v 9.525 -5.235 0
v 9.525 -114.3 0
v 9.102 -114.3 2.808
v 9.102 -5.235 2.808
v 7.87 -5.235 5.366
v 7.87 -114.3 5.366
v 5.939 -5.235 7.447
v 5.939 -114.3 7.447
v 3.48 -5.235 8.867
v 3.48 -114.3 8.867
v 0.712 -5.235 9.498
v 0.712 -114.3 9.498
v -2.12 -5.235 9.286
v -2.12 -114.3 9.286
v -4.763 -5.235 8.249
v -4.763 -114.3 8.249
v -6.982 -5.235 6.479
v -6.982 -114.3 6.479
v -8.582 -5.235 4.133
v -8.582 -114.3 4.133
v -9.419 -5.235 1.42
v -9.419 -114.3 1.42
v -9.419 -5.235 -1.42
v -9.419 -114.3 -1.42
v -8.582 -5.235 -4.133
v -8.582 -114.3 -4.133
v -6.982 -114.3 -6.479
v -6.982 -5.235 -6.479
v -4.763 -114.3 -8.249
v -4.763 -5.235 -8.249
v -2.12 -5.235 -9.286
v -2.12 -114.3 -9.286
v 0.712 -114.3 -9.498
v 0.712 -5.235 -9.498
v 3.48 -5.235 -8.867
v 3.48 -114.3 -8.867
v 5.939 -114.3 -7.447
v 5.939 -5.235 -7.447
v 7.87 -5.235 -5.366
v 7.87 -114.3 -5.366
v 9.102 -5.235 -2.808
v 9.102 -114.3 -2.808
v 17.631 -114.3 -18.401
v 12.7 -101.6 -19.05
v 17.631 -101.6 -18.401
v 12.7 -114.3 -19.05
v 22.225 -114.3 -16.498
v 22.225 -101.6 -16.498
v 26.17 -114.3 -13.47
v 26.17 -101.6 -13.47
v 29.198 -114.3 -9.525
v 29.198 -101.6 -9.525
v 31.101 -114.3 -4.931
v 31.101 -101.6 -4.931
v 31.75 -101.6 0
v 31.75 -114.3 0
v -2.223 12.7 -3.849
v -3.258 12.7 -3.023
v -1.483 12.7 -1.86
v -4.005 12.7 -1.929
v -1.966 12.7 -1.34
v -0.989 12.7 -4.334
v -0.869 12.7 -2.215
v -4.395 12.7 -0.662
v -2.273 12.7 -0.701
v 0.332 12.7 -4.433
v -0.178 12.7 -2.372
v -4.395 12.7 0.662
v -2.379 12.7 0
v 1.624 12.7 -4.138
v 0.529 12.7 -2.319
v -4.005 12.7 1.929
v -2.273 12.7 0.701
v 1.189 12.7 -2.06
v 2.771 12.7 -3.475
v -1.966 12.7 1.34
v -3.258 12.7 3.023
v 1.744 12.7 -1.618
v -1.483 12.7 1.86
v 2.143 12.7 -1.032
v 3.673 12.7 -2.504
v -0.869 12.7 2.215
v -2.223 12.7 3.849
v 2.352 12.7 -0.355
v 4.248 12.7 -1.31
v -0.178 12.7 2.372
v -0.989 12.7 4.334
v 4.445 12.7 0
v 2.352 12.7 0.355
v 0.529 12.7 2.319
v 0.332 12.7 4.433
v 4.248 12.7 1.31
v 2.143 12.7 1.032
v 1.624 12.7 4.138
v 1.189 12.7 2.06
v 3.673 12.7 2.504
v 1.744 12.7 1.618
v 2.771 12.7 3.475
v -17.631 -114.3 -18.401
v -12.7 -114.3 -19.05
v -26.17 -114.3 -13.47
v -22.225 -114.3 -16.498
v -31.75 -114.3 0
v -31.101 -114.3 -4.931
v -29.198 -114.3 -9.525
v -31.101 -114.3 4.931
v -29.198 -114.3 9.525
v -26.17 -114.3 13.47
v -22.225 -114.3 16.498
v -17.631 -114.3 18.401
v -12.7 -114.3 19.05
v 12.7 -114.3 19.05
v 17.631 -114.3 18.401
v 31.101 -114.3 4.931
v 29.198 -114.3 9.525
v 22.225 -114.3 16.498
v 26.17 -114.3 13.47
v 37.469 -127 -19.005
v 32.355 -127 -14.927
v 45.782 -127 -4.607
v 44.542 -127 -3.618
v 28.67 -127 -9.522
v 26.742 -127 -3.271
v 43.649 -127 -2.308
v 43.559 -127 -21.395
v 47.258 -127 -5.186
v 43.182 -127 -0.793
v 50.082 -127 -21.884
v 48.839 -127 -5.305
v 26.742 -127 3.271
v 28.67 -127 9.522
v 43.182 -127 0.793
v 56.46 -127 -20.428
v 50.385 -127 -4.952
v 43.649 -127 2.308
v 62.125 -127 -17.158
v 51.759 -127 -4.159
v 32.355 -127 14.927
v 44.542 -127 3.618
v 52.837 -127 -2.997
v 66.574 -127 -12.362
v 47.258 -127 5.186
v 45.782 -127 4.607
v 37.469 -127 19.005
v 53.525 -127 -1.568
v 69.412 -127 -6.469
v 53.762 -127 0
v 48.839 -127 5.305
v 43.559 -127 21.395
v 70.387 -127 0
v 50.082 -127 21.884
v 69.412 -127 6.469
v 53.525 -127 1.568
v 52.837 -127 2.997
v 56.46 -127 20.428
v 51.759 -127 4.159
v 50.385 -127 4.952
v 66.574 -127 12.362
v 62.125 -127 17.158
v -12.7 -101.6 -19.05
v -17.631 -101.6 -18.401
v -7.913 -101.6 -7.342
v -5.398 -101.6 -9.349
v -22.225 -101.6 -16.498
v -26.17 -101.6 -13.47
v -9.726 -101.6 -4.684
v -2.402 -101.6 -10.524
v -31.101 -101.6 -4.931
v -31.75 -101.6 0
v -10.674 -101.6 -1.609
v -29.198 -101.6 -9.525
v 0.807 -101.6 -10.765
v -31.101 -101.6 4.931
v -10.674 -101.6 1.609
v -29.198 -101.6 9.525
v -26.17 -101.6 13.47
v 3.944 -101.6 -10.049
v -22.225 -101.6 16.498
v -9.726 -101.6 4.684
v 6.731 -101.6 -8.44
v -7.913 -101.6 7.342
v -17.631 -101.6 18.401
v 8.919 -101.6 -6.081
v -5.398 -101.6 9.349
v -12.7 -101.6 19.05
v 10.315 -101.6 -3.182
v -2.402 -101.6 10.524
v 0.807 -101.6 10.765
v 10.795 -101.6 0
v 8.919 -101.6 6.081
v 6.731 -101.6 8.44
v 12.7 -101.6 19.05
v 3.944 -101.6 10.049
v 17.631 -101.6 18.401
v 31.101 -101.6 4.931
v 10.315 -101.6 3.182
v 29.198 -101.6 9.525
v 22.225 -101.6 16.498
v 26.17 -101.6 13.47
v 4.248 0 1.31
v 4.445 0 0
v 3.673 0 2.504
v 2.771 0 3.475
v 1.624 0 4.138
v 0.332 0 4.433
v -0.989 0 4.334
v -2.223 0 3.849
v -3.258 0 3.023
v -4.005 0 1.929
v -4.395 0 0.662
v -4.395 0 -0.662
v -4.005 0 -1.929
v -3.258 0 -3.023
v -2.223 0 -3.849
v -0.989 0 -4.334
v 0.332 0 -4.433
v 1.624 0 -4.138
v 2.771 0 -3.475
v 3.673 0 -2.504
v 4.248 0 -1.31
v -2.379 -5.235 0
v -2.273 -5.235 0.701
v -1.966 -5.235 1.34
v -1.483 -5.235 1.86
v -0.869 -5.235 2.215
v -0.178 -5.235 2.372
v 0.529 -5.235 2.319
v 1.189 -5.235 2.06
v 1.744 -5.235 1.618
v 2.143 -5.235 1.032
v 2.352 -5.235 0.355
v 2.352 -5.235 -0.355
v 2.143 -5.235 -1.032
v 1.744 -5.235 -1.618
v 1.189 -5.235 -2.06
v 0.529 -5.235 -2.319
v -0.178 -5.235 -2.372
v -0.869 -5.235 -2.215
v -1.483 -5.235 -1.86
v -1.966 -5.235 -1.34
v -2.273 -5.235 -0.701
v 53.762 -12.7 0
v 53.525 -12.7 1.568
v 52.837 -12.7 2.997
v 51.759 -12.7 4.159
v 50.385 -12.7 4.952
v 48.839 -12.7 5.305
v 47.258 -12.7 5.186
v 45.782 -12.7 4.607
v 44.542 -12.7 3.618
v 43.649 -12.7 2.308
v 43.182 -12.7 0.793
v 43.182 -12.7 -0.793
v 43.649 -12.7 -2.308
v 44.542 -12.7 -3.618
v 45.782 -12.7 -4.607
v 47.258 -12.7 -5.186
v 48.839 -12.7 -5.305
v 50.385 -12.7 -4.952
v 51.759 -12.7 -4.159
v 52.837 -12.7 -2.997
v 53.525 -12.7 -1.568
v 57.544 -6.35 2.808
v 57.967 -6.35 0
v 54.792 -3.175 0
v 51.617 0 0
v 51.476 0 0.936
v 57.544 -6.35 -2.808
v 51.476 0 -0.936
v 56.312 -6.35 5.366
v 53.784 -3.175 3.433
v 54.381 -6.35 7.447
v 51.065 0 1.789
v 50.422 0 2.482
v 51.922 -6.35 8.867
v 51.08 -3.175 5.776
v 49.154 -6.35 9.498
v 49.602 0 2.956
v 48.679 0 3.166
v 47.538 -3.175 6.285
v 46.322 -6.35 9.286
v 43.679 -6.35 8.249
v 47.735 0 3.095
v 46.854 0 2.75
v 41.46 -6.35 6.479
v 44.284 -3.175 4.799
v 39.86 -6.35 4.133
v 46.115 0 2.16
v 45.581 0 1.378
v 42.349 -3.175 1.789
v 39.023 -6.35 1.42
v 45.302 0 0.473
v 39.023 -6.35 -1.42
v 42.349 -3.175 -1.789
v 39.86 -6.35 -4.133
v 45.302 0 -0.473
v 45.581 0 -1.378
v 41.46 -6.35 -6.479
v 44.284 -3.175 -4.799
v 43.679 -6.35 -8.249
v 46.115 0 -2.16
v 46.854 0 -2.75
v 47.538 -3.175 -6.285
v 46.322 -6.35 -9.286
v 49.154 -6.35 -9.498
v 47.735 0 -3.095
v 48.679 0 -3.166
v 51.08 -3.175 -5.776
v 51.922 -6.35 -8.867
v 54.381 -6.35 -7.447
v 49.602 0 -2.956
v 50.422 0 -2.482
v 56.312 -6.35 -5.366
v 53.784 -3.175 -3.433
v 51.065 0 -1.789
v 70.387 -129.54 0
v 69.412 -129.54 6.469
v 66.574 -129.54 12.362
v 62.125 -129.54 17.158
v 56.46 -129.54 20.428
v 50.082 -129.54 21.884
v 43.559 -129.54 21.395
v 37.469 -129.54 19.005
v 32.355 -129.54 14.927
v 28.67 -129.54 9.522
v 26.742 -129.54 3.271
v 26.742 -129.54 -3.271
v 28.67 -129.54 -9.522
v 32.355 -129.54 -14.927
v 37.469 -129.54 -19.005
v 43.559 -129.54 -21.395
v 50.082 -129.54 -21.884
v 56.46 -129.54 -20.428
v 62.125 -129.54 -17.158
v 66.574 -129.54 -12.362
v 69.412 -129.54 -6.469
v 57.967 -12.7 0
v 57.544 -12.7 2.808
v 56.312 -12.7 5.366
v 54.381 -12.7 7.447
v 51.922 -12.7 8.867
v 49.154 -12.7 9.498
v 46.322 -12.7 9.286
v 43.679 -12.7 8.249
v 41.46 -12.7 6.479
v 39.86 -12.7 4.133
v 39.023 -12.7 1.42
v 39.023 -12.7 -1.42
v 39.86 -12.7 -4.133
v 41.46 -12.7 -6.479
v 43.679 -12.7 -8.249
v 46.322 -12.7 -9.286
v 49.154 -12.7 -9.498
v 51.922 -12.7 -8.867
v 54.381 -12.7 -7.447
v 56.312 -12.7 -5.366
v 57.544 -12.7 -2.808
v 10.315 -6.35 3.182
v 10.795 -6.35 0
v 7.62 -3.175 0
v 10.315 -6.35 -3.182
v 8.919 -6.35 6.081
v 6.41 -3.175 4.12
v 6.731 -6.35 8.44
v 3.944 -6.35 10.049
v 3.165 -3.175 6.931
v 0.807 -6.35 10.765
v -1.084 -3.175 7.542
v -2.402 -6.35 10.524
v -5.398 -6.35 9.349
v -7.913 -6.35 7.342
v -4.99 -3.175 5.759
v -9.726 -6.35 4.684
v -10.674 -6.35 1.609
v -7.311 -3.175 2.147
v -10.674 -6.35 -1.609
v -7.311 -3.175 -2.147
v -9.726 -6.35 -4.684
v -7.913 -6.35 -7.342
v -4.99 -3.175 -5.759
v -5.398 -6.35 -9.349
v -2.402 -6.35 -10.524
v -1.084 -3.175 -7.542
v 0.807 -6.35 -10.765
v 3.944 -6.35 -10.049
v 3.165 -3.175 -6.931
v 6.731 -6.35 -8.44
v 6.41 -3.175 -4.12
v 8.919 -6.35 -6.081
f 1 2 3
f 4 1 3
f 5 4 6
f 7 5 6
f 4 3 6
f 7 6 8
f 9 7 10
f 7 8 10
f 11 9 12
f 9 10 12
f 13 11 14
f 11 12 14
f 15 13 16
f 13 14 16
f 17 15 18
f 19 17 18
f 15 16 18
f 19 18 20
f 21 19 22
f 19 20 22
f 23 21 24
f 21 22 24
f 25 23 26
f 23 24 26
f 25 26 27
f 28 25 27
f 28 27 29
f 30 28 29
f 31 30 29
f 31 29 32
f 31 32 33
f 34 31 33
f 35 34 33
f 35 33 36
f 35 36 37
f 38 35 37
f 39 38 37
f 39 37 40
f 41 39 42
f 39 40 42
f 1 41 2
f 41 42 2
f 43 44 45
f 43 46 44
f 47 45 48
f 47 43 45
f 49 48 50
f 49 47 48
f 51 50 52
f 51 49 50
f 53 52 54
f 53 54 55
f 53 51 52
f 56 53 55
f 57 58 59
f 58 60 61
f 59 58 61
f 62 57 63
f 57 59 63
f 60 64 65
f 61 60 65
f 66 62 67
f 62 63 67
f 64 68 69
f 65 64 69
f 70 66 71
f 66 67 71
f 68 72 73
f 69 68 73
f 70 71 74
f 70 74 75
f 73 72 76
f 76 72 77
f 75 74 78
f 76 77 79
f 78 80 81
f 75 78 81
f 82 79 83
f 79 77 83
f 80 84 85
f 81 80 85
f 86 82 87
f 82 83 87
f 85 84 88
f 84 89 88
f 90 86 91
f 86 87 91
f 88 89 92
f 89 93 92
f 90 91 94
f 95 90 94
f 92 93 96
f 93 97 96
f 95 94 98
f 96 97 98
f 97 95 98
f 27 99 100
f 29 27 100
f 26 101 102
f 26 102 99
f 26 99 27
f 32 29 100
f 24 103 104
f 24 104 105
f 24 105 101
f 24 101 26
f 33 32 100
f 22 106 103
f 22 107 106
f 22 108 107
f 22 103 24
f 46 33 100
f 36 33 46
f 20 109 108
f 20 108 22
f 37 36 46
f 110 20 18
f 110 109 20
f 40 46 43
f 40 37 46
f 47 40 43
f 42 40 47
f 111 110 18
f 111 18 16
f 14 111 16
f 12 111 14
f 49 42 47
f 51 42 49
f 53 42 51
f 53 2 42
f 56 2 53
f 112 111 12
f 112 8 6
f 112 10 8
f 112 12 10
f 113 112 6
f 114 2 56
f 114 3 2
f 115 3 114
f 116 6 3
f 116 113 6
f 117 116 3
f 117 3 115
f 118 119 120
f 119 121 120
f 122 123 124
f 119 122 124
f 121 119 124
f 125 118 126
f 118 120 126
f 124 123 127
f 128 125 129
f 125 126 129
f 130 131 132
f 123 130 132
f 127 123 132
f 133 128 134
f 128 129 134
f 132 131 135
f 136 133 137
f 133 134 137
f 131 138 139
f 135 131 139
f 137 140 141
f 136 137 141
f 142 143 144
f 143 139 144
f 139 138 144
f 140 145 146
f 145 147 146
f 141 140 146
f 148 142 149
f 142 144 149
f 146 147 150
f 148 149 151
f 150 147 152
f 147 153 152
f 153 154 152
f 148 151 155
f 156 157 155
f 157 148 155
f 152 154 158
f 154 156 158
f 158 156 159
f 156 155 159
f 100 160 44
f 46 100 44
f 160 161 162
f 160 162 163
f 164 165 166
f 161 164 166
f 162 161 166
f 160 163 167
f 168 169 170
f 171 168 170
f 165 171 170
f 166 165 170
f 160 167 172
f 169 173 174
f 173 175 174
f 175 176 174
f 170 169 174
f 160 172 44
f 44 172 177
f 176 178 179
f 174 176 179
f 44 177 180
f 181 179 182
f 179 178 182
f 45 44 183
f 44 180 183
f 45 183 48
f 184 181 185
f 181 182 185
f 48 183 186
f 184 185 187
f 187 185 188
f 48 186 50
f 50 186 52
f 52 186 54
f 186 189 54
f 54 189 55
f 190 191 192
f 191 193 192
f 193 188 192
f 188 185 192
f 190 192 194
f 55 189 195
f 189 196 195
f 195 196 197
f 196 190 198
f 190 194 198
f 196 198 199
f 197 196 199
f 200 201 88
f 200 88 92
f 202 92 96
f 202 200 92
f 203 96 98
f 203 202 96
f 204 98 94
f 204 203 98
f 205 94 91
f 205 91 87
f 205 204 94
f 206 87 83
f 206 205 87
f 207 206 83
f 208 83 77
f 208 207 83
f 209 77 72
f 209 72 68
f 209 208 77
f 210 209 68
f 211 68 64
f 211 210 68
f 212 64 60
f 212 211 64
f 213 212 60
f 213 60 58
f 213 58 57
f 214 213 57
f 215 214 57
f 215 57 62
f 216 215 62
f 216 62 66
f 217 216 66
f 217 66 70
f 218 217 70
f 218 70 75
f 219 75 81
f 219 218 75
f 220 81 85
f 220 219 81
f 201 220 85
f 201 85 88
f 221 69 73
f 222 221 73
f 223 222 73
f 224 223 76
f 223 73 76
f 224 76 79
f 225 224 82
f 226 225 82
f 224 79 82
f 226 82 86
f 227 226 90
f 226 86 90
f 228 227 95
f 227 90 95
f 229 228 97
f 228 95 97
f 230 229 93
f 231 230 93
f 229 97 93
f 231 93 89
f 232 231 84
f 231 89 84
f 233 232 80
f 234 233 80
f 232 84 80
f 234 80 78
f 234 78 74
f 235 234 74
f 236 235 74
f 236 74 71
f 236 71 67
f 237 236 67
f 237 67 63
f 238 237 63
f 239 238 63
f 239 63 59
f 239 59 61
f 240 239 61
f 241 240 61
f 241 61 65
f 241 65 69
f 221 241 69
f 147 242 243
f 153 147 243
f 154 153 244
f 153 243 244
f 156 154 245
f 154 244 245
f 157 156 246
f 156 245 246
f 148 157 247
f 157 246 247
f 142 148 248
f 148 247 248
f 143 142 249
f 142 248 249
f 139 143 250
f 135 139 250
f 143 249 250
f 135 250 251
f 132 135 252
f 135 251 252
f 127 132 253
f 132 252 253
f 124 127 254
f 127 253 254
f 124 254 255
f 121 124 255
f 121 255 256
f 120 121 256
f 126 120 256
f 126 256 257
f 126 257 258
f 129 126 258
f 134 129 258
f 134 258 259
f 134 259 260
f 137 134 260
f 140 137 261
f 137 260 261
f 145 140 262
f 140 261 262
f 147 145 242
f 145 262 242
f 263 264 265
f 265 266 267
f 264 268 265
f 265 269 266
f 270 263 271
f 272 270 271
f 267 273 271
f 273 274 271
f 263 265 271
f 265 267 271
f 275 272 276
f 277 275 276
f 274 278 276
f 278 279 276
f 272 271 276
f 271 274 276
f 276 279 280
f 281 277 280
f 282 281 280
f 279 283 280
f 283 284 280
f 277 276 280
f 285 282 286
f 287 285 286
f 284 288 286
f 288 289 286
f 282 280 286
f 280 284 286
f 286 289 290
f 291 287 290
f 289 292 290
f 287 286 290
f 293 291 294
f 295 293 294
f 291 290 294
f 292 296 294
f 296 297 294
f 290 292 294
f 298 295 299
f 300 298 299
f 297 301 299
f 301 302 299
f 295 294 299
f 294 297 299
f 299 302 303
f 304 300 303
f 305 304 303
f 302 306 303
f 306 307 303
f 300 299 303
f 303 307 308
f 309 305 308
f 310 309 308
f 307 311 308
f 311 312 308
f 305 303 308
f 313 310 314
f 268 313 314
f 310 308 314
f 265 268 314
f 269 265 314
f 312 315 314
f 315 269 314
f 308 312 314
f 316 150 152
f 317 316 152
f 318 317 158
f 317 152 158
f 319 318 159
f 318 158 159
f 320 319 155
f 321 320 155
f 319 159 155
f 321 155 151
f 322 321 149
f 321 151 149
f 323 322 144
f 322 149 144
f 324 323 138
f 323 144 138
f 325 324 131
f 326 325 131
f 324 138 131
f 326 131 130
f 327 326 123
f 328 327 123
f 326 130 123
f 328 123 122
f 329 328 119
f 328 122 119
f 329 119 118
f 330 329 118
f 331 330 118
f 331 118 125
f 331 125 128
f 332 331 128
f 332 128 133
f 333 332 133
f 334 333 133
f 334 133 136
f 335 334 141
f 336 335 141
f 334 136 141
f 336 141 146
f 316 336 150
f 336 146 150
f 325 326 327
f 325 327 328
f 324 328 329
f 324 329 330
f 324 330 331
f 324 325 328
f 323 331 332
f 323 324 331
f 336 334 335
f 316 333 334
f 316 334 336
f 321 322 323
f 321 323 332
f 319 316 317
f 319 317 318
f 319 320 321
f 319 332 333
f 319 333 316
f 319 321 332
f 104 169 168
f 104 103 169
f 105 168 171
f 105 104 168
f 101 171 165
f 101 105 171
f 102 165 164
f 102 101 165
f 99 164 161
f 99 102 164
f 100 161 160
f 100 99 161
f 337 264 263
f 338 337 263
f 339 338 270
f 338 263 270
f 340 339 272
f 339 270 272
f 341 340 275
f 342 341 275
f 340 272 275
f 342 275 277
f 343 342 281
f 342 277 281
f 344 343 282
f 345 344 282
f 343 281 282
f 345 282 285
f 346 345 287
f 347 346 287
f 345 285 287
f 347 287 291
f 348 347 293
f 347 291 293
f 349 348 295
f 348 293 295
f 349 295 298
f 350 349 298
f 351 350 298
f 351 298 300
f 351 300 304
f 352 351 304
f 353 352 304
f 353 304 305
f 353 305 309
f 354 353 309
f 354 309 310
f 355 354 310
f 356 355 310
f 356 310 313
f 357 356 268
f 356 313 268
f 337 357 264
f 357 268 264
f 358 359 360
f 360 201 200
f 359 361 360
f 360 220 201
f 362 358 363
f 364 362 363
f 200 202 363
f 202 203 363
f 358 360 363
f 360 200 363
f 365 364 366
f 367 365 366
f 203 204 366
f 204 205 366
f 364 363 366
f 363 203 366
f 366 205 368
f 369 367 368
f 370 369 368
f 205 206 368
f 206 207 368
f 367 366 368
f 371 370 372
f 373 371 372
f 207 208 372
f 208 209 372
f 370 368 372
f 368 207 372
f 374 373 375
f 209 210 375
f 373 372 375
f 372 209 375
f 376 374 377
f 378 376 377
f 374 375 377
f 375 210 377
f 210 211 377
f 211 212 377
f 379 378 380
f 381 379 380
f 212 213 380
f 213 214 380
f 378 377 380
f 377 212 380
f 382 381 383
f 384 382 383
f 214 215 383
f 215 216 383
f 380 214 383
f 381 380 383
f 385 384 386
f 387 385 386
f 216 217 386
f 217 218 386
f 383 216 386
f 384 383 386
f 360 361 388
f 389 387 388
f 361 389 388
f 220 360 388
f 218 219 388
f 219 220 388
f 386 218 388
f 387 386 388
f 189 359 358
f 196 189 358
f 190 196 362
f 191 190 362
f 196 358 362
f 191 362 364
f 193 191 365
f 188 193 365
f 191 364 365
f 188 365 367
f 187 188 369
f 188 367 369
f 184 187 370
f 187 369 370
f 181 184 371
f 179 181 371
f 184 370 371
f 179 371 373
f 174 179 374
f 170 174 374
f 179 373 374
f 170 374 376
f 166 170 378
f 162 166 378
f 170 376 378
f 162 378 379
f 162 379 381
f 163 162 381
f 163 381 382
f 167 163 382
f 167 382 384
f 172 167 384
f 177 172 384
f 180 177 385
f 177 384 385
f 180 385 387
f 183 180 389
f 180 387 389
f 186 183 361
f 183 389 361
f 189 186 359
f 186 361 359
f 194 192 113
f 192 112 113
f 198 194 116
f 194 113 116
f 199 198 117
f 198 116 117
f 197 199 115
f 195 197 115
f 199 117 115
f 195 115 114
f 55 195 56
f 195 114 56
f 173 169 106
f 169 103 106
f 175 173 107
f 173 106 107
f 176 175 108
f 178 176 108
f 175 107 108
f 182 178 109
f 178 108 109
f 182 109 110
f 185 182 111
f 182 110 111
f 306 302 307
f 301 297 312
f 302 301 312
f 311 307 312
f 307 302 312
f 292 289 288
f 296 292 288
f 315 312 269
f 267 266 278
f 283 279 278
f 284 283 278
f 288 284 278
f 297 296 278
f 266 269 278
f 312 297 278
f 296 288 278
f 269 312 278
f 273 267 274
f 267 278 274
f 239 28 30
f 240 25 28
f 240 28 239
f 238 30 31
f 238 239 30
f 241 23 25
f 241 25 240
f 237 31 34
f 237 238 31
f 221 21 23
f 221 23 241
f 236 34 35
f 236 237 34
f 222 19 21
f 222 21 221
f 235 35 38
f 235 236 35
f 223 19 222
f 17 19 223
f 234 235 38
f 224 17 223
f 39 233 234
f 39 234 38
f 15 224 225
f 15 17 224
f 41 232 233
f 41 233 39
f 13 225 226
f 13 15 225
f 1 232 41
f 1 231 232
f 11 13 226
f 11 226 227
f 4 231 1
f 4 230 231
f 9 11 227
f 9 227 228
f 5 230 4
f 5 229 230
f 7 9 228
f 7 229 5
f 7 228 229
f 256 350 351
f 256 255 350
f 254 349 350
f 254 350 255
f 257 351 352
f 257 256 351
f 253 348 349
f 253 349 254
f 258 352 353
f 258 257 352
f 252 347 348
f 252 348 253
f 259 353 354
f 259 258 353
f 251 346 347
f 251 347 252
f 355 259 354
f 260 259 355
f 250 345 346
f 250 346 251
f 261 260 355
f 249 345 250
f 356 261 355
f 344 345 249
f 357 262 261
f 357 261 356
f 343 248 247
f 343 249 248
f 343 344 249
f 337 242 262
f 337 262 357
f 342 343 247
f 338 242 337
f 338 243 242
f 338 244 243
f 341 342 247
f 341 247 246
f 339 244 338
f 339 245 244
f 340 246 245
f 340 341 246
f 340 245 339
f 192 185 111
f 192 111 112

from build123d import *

# Parameters (mm, degrees)
F0_R      = 10.795
F1_DEPTH  = 101.6
F2_SIZE   = 6.35
F3_DEPTH  = 12.7
F4_W      = 63.5
F4_H      = 38.1
F5_DEPTH  = 12.7
F6_R      = 19.04999
F7_R      = 9.525
F8_DEPTH  = 109.06528
F9_R      = 2.3789918441
F10_DEPTH = 87.48307
F11_DEPTH = 12.7
F0_R_2    = 9.525
F12_DEPTH = 12.7
F13_SIZE  = 6.35
F14_R     = 5.3195531206
F15_DEPTH = 114.3
F16_R     = 21.9454627566
F17_DEPTH = 2.54


# Not quite as in the source:
# - a fillet or chamfer is up to 0.001 mm smaller than in the source, because OpenCascade refuses the exact size


with BuildPart() as f1:
    # F0 (on Front) → F1 (new body)
    with BuildSketch(Plane.XZ):
        Circle(F0_R)
    extrude(amount=F1_DEPTH)

    # F2
    f2_edges = [f1.edges().sort_by_distance(p)[0] for p in [
        (-10.795, 0, 0),
    ]]
    chamfer(f2_edges, length=F2_SIZE)

    # F3 (add): a face of the model
    f3_faces = [f1.faces().sort_by_distance(p)[0] for p in [
        (0, 0, 0),
    ]]
    extrude(f3_faces, amount=F3_DEPTH)

    # F4 (on face) → F5 (join)
    with BuildSketch(Plane.XZ.offset(101.6)):
        Rectangle(F4_W, F4_H)
    extrude(amount=F5_DEPTH)

    # F6 (radius 19.05 in the source; OpenCascade refuses exactly that, so slightly less here)
    f6_edges = [f1.edges().sort_by_distance(p)[0] for p in [
        (-31.75, -107.95, 19.05),
        (31.75, -107.95, 19.05),
        (31.75, -107.95, -19.05),
        (-31.75, -107.95, -19.05),
    ]]
    fillet(f6_edges, radius=F6_R)

    # F7 (on face) → F8 (cut)
    with BuildSketch(Plane.XZ.offset(114.3)):
        Circle(F7_R)
    extrude(amount=-F8_DEPTH, mode=Mode.SUBTRACT)

    # F9 (on face) → F10 (cut)
    with BuildSketch(Plane(origin=(0, 12.7, 0), x_dir=(-1, 0, 0), z_dir=(0, 1, 0))):
        Circle(F9_R)
    extrude(amount=-F10_DEPTH, mode=Mode.SUBTRACT)


with BuildPart() as f11:
    # F0 (on Front) → F11 (new body)
    with BuildSketch(Plane.XZ):
        Circle(F0_R)
    extrude(amount=F11_DEPTH)


with BuildPart() as f12:
    # F0 (on Front) → F12 (new body)
    with BuildSketch(Plane.XZ):
        with Locations((48.4419576824, 0)):
            Circle(F0_R_2)
    extrude(amount=F12_DEPTH)

    # F13
    f13_edges = [f12.edges().sort_by_distance(p)[0] for p in [
        (38.916958, 0, 0),
    ]]
    chamfer(f13_edges, length=F13_SIZE)

    # F14 (on face) → F15 (join)
    with BuildSketch(Plane.XZ.offset(12.7)):
        with Locations((48.4419576824, 0)):
            Circle(F14_R)
    extrude(amount=F15_DEPTH)

    # F16 (on face) → F17 (join)
    with BuildSketch(Plane.XZ.offset(127)):
        with Locations((48.4419576824, 0)):
            Circle(F16_R)
    extrude(amount=F17_DEPTH)


solid = Compound([f1.part, f12.part])
